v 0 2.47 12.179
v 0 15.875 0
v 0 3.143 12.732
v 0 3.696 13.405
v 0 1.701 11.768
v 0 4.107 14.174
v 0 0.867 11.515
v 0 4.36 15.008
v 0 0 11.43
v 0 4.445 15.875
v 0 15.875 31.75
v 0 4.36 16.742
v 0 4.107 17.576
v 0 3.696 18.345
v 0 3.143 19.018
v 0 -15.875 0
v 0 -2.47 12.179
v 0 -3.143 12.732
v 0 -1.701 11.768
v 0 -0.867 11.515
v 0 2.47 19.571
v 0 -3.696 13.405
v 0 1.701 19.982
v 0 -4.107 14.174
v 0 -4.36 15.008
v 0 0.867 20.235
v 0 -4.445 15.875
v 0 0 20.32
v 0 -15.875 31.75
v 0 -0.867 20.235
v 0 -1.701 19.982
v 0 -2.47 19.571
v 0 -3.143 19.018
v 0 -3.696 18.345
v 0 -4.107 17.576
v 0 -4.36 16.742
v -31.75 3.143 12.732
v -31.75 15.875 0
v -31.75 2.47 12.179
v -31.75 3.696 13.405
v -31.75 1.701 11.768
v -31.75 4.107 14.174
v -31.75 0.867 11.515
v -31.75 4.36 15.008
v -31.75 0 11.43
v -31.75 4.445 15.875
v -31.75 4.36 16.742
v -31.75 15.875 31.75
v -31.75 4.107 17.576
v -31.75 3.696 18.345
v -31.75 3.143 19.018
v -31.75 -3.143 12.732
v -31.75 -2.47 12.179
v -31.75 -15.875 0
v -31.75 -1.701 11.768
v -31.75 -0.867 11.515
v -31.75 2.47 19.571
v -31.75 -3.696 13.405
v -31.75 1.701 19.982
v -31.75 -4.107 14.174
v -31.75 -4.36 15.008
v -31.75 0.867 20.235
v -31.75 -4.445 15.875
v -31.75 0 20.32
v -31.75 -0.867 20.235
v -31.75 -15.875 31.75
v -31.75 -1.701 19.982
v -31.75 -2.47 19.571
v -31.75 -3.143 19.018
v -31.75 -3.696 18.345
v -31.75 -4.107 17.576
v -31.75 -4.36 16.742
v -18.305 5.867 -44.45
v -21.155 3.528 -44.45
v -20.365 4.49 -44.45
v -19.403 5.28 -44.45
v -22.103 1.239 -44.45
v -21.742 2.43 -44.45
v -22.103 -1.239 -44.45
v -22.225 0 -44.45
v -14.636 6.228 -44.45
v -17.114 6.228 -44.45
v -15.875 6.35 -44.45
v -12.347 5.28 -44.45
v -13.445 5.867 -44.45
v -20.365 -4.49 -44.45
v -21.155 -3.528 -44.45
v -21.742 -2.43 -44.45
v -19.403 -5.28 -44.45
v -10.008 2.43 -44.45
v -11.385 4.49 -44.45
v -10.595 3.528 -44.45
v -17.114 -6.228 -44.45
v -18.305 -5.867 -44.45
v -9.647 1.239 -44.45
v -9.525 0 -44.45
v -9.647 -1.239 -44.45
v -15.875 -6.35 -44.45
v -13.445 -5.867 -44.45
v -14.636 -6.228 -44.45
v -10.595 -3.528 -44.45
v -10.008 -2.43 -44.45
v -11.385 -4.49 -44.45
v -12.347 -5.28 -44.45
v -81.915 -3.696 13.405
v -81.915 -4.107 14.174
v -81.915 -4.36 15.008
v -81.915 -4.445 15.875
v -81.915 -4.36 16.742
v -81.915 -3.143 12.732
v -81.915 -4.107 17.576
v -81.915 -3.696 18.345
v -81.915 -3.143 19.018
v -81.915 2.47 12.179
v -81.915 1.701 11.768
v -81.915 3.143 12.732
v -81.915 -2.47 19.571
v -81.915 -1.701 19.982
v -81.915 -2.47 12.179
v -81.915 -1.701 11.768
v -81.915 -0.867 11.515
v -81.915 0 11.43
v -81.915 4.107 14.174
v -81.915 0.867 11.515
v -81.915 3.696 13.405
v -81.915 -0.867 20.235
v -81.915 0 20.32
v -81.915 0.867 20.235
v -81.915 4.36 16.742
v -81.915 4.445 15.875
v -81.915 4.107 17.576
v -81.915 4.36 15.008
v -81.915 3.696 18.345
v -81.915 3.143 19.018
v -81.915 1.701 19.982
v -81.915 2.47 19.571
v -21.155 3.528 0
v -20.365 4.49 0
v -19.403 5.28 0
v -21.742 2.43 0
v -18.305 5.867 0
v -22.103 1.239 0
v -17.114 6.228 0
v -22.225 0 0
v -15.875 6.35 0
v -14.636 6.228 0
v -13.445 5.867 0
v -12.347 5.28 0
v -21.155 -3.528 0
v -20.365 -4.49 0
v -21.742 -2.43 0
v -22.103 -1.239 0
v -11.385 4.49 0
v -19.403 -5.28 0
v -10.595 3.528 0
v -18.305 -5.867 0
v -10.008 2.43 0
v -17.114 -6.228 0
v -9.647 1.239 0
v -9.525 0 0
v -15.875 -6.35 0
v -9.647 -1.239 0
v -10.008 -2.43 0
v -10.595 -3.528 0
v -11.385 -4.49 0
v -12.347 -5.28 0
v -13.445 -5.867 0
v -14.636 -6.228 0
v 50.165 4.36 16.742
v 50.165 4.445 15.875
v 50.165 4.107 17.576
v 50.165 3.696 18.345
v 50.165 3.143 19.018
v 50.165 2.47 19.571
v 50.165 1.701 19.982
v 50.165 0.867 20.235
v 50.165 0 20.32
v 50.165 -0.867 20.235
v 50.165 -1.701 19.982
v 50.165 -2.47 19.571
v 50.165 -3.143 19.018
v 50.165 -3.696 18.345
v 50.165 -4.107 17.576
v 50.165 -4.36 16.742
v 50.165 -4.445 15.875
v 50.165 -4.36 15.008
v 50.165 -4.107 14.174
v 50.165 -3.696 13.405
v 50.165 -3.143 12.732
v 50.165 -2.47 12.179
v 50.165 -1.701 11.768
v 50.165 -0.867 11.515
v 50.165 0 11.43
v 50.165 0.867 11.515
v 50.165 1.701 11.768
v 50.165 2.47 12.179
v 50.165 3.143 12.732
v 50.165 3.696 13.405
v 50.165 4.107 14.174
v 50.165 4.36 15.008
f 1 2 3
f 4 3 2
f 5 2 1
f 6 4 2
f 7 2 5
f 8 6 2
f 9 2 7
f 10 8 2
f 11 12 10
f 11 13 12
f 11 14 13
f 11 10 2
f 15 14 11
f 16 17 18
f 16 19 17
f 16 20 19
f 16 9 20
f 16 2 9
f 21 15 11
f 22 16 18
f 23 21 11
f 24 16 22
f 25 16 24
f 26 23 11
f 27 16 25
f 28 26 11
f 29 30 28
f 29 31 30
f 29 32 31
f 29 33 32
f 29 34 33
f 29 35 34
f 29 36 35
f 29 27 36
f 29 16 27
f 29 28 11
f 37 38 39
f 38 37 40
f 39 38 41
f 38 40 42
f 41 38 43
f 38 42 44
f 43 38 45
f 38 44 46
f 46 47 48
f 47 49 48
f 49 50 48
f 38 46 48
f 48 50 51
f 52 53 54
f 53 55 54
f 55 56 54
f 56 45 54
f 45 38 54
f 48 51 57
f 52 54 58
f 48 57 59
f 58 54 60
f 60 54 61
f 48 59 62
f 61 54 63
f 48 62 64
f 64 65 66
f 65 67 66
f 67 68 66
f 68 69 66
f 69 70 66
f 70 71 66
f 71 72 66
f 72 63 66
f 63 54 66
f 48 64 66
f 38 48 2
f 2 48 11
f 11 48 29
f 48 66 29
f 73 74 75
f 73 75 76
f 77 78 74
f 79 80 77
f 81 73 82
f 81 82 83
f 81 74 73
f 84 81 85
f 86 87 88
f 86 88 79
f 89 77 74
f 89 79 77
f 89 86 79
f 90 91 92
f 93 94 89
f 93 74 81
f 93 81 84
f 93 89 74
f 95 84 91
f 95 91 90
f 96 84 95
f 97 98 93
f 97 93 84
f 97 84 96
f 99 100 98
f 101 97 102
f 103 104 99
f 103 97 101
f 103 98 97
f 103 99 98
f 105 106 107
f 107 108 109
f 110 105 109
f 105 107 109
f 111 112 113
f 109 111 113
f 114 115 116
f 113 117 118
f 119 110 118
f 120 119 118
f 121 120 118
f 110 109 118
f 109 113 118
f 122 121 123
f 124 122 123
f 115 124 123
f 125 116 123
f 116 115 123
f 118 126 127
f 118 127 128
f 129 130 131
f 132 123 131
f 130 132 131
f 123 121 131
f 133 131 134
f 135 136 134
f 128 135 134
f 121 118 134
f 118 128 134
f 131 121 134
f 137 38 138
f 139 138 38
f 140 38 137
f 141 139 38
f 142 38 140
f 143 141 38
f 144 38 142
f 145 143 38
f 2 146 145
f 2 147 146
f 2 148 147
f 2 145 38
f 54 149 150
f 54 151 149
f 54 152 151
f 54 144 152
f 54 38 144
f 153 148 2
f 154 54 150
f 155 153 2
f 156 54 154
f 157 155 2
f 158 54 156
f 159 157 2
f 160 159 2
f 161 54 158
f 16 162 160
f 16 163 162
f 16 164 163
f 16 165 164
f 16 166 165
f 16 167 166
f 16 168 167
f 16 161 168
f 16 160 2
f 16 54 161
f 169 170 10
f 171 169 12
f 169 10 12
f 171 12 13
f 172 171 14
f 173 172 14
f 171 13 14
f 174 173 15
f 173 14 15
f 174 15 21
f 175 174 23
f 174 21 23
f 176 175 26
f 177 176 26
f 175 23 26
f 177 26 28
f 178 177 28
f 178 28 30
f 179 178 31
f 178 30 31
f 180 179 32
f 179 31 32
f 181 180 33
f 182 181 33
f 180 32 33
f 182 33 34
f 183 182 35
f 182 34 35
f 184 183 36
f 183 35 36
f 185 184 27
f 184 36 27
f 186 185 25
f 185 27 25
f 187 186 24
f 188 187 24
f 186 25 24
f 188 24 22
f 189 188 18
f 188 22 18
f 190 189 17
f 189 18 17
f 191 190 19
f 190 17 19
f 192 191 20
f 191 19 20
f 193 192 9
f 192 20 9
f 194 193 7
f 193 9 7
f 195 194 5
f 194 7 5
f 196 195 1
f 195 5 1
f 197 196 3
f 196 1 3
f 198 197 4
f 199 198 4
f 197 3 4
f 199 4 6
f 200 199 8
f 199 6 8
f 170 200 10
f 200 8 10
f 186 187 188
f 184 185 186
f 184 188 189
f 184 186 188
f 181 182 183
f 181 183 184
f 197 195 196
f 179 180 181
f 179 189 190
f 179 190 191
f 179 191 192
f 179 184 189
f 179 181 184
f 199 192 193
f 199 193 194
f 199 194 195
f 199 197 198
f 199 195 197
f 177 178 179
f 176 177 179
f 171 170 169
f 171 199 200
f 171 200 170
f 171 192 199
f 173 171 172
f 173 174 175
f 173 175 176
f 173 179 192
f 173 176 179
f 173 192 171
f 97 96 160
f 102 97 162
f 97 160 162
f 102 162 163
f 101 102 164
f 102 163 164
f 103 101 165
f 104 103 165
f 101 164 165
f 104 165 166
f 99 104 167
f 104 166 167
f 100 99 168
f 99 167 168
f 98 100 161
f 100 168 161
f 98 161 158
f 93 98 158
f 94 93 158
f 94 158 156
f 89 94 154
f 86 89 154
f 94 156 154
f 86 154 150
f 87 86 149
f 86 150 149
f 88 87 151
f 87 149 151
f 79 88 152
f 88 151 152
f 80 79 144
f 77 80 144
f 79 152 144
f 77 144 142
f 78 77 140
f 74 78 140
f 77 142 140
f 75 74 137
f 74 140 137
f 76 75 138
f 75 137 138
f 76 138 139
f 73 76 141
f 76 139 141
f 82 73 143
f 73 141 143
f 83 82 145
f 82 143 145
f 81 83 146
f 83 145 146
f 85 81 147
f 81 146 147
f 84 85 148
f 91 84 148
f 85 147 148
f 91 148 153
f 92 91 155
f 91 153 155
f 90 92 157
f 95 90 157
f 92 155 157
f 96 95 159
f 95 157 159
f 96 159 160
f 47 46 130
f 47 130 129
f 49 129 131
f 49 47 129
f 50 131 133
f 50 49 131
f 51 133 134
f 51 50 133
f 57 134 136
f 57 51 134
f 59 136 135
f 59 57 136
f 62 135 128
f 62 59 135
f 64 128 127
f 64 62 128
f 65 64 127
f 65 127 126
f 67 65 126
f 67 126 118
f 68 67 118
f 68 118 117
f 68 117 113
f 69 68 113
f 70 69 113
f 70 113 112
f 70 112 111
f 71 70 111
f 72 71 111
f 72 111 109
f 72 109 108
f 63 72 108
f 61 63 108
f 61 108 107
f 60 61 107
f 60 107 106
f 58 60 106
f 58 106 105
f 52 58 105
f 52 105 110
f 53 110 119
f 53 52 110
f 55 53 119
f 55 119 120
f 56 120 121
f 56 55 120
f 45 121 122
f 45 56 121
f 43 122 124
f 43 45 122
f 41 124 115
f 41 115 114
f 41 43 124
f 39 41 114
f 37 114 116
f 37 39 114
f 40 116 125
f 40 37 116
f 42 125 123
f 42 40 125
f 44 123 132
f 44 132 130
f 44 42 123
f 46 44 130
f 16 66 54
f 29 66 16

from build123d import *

# Parameters (mm, degrees)
F0_W          = 31.75
F0_H          = 31.75
F1_DEPTH      = 15.875
F2_R          = 4.445
F3_DEPTH      = 50.165
F3_DEPTH_BACK = 81.915
F4_R          = 6.35
F5_DEPTH      = 44.45


with BuildPart() as f1:
    # F0 (on Front) → F1 (new body, symmetric)
    with BuildSketch(Plane.XZ):
        with Locations((-15.875, 15.875)):
            Rectangle(F0_W, F0_H)
    extrude(amount=F1_DEPTH, both=True)

    # F2 (on face) → F3 (join, two sides)
    with BuildSketch(Plane.YZ) as f3_sk:
        with Locations((0, 15.875)):
            Circle(F2_R)
    extrude(amount=F3_DEPTH)
    extrude(f3_sk.sketch, amount=-F3_DEPTH_BACK)

    # F4 (on face) → F5 (join)
    with BuildSketch(Plane(origin=(0, 0, 0), x_dir=(1, 0, 0), z_dir=(0, 0, -1))):
        with Locations((-15.875, 0)):
            Circle(F4_R)
    extrude(amount=F5_DEPTH)


solid = f1.part
